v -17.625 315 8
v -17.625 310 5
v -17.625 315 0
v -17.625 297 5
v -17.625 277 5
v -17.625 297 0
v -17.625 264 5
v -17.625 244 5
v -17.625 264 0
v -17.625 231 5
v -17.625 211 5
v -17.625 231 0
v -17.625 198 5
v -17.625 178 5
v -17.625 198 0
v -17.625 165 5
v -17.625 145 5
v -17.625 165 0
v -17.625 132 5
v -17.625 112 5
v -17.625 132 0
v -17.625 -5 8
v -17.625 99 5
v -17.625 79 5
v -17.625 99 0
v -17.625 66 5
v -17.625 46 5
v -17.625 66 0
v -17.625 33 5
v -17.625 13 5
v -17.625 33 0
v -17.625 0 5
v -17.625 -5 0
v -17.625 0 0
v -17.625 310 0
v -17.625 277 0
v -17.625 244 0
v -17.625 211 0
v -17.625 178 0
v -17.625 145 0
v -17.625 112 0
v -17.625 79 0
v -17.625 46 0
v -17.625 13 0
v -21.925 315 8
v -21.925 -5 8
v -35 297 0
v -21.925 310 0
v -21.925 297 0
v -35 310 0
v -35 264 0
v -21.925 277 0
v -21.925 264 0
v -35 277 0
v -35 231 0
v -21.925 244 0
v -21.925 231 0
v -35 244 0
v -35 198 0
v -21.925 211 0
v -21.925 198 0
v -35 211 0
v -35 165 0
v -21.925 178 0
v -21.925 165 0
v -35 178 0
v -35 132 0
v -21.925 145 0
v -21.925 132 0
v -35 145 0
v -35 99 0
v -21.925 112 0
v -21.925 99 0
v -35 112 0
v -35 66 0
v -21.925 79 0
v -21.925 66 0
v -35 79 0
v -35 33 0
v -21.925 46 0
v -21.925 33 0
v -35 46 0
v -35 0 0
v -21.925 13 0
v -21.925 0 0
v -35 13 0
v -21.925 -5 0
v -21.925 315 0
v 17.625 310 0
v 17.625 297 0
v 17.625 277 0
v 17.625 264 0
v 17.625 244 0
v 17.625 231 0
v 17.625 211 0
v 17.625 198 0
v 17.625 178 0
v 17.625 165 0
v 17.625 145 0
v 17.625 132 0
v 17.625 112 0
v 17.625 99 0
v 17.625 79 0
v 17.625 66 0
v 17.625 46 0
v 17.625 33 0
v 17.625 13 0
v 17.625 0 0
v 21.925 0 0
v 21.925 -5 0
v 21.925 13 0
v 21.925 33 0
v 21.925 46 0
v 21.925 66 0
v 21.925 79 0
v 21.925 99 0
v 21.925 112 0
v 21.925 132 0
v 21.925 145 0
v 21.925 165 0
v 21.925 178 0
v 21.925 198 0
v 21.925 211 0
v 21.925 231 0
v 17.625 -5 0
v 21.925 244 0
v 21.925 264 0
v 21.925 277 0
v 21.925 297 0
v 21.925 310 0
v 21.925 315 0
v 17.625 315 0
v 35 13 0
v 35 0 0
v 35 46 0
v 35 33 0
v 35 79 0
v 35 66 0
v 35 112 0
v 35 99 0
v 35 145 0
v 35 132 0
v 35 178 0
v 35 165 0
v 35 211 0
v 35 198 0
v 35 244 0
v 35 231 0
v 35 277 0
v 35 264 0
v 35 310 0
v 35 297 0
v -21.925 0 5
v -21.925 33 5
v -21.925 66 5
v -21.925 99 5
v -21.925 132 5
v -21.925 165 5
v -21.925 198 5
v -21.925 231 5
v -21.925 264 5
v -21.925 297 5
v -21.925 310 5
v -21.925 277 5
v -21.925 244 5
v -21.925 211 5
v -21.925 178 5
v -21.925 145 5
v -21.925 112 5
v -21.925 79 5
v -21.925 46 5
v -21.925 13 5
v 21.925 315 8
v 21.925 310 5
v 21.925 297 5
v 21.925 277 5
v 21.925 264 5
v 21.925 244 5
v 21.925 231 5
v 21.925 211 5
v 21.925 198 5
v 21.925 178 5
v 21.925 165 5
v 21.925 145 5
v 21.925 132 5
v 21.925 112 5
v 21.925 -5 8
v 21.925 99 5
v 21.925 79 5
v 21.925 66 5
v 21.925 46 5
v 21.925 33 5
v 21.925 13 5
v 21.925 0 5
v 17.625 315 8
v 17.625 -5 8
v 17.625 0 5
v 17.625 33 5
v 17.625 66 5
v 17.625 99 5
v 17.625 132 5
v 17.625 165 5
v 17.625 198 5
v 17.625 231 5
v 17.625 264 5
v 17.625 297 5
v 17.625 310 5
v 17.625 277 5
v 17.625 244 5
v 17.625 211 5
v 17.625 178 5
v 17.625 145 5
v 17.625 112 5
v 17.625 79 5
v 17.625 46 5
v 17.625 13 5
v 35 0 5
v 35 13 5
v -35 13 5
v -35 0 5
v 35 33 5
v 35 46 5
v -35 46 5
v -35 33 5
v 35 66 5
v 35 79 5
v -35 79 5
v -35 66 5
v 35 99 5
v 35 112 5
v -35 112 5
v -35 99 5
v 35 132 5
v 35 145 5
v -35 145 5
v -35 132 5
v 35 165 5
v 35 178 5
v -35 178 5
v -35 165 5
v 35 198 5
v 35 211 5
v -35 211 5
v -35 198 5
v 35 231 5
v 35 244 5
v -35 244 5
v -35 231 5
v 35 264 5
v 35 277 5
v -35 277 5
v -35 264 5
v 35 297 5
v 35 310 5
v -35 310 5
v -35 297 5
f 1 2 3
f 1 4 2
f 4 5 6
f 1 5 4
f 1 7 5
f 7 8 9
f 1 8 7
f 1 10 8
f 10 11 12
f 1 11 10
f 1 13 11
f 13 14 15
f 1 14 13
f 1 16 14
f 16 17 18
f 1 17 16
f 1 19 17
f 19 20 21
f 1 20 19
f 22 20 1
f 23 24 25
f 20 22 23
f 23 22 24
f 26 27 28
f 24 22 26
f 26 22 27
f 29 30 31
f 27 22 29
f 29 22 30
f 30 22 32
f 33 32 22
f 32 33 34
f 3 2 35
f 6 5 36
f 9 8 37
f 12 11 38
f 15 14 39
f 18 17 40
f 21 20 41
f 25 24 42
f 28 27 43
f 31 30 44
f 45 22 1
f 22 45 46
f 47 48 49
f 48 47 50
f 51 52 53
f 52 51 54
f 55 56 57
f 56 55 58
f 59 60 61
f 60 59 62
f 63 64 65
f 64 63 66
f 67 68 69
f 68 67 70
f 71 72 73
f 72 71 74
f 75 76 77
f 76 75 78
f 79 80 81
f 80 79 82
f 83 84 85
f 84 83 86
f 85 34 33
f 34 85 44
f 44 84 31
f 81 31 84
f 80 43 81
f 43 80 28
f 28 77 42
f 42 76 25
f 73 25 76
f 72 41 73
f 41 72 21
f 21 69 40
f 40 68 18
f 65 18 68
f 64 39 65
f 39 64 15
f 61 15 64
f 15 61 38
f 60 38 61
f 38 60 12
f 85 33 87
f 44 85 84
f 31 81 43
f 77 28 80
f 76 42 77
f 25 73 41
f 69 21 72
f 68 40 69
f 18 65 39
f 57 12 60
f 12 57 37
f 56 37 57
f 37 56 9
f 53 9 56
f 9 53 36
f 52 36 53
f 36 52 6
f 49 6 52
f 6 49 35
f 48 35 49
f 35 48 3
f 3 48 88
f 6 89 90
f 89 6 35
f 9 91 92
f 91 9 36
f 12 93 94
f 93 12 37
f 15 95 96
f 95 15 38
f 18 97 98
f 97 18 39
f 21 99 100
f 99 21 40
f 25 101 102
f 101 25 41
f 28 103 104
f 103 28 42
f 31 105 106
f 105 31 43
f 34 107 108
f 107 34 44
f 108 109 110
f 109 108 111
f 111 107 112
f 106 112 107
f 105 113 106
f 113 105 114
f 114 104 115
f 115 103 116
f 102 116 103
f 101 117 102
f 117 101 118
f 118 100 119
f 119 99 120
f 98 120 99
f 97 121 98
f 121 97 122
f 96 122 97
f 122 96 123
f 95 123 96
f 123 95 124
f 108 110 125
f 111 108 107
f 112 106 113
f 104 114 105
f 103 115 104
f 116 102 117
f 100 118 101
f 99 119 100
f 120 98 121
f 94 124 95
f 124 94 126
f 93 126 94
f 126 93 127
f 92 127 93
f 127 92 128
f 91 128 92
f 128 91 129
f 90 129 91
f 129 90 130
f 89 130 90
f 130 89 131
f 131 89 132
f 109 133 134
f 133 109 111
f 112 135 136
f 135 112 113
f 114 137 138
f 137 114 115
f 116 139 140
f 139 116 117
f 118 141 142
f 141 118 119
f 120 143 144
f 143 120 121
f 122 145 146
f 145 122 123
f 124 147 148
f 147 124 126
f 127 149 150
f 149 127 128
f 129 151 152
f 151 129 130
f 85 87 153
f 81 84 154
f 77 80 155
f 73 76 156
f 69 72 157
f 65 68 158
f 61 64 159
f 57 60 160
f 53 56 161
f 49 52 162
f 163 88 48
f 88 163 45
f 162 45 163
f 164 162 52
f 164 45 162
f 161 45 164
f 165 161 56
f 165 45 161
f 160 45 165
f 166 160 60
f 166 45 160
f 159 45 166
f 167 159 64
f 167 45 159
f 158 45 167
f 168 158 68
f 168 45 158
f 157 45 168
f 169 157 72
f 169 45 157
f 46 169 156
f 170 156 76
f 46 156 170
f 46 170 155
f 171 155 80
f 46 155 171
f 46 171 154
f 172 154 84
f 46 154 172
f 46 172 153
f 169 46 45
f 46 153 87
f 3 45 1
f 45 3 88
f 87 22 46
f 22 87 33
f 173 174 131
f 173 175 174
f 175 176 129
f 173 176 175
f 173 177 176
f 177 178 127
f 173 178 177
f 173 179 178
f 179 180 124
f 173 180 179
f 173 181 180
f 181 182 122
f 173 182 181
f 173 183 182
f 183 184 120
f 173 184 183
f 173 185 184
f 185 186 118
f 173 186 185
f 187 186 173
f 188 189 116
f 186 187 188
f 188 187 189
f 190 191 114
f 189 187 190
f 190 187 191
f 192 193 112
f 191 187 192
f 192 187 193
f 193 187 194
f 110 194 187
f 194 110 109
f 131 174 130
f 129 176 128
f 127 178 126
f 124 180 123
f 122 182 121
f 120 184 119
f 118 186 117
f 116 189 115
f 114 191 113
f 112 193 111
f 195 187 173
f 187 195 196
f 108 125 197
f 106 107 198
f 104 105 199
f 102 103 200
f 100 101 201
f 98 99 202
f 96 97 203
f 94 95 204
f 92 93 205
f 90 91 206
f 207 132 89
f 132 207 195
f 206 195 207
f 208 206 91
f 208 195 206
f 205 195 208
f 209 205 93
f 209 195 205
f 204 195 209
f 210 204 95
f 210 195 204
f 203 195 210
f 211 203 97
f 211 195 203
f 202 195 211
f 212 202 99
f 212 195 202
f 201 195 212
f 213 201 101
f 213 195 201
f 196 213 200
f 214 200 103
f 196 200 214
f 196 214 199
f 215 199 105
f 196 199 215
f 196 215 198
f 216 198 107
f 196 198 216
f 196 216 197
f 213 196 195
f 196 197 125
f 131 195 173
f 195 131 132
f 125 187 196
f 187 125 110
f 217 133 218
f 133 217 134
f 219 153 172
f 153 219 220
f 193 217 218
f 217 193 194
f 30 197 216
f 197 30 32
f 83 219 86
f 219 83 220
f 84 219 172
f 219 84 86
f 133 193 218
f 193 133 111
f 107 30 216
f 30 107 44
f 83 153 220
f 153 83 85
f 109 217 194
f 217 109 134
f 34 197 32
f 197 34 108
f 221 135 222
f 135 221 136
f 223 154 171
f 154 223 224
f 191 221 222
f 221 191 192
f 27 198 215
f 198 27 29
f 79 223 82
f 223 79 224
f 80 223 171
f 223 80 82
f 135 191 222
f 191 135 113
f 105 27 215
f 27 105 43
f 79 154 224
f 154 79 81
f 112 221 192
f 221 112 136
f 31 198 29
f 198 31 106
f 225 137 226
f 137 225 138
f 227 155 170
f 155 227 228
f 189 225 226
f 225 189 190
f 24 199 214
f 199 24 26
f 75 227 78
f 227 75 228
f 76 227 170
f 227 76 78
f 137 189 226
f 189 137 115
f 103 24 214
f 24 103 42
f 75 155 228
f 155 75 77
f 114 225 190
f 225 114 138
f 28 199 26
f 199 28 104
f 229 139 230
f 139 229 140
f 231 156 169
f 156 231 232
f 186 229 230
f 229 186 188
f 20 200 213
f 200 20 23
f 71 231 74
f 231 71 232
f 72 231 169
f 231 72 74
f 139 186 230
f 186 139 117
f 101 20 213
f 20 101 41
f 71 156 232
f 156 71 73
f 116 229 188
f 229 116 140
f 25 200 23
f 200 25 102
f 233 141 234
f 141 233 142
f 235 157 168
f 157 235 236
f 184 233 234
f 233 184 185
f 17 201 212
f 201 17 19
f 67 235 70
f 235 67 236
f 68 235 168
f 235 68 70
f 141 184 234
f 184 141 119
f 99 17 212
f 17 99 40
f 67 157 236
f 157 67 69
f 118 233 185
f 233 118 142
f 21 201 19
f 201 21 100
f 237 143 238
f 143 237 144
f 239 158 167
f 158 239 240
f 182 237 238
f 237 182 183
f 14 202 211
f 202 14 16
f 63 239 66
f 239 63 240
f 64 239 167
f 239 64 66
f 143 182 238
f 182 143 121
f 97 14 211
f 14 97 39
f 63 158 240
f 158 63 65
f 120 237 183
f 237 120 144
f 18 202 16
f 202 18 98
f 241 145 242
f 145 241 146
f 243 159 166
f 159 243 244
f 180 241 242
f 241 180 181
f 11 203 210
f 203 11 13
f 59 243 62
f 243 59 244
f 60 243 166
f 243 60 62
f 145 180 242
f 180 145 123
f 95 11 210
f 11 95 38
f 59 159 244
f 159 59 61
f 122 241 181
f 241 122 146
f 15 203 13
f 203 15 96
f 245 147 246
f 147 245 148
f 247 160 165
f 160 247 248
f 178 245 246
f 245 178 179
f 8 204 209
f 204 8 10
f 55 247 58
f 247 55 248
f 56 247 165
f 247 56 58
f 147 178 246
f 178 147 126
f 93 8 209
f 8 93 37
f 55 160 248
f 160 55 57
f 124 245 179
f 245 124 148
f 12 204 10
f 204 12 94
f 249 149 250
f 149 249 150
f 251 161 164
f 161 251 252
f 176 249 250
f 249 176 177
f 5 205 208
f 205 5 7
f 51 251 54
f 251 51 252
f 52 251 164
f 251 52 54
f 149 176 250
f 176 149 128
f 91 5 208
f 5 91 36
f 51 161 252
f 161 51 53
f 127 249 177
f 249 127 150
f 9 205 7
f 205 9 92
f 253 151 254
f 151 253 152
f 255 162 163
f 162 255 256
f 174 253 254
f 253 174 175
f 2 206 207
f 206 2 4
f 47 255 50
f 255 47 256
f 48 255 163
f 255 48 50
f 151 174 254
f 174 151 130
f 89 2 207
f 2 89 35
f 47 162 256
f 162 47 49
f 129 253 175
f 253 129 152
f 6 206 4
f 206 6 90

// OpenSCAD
module tracks(length, off)
{
  sleeper_size = [70, 13, 5];
  sleeper_span = 20;

  track_size = [4.3, length, 3];
  track_span = 30.45 + 2*2.3 + 2*0.1;

  module sleeper()
  {
    translate([-sleeper_size.x/2, 0, 0])
      cube(sleeper_size);
  }

  module track(dir)
  {
    dx = dir < 0 ? -track_size.x : 0;
    translate([dx + dir*track_span/2, 0, 0])
      cube(track_size + [0, 0, sleeper_size.z]);
  }

  translate([0, -off, 0])
    for(dir = [-1, +1])
      track(dir);
  for(dy = [0 : sleeper_span+sleeper_size.y : length])
    translate([0, dy, 0])
      sleeper();
}


tracks(length=320, off=5); // ~320mm, with a nice, flat finish at the end
